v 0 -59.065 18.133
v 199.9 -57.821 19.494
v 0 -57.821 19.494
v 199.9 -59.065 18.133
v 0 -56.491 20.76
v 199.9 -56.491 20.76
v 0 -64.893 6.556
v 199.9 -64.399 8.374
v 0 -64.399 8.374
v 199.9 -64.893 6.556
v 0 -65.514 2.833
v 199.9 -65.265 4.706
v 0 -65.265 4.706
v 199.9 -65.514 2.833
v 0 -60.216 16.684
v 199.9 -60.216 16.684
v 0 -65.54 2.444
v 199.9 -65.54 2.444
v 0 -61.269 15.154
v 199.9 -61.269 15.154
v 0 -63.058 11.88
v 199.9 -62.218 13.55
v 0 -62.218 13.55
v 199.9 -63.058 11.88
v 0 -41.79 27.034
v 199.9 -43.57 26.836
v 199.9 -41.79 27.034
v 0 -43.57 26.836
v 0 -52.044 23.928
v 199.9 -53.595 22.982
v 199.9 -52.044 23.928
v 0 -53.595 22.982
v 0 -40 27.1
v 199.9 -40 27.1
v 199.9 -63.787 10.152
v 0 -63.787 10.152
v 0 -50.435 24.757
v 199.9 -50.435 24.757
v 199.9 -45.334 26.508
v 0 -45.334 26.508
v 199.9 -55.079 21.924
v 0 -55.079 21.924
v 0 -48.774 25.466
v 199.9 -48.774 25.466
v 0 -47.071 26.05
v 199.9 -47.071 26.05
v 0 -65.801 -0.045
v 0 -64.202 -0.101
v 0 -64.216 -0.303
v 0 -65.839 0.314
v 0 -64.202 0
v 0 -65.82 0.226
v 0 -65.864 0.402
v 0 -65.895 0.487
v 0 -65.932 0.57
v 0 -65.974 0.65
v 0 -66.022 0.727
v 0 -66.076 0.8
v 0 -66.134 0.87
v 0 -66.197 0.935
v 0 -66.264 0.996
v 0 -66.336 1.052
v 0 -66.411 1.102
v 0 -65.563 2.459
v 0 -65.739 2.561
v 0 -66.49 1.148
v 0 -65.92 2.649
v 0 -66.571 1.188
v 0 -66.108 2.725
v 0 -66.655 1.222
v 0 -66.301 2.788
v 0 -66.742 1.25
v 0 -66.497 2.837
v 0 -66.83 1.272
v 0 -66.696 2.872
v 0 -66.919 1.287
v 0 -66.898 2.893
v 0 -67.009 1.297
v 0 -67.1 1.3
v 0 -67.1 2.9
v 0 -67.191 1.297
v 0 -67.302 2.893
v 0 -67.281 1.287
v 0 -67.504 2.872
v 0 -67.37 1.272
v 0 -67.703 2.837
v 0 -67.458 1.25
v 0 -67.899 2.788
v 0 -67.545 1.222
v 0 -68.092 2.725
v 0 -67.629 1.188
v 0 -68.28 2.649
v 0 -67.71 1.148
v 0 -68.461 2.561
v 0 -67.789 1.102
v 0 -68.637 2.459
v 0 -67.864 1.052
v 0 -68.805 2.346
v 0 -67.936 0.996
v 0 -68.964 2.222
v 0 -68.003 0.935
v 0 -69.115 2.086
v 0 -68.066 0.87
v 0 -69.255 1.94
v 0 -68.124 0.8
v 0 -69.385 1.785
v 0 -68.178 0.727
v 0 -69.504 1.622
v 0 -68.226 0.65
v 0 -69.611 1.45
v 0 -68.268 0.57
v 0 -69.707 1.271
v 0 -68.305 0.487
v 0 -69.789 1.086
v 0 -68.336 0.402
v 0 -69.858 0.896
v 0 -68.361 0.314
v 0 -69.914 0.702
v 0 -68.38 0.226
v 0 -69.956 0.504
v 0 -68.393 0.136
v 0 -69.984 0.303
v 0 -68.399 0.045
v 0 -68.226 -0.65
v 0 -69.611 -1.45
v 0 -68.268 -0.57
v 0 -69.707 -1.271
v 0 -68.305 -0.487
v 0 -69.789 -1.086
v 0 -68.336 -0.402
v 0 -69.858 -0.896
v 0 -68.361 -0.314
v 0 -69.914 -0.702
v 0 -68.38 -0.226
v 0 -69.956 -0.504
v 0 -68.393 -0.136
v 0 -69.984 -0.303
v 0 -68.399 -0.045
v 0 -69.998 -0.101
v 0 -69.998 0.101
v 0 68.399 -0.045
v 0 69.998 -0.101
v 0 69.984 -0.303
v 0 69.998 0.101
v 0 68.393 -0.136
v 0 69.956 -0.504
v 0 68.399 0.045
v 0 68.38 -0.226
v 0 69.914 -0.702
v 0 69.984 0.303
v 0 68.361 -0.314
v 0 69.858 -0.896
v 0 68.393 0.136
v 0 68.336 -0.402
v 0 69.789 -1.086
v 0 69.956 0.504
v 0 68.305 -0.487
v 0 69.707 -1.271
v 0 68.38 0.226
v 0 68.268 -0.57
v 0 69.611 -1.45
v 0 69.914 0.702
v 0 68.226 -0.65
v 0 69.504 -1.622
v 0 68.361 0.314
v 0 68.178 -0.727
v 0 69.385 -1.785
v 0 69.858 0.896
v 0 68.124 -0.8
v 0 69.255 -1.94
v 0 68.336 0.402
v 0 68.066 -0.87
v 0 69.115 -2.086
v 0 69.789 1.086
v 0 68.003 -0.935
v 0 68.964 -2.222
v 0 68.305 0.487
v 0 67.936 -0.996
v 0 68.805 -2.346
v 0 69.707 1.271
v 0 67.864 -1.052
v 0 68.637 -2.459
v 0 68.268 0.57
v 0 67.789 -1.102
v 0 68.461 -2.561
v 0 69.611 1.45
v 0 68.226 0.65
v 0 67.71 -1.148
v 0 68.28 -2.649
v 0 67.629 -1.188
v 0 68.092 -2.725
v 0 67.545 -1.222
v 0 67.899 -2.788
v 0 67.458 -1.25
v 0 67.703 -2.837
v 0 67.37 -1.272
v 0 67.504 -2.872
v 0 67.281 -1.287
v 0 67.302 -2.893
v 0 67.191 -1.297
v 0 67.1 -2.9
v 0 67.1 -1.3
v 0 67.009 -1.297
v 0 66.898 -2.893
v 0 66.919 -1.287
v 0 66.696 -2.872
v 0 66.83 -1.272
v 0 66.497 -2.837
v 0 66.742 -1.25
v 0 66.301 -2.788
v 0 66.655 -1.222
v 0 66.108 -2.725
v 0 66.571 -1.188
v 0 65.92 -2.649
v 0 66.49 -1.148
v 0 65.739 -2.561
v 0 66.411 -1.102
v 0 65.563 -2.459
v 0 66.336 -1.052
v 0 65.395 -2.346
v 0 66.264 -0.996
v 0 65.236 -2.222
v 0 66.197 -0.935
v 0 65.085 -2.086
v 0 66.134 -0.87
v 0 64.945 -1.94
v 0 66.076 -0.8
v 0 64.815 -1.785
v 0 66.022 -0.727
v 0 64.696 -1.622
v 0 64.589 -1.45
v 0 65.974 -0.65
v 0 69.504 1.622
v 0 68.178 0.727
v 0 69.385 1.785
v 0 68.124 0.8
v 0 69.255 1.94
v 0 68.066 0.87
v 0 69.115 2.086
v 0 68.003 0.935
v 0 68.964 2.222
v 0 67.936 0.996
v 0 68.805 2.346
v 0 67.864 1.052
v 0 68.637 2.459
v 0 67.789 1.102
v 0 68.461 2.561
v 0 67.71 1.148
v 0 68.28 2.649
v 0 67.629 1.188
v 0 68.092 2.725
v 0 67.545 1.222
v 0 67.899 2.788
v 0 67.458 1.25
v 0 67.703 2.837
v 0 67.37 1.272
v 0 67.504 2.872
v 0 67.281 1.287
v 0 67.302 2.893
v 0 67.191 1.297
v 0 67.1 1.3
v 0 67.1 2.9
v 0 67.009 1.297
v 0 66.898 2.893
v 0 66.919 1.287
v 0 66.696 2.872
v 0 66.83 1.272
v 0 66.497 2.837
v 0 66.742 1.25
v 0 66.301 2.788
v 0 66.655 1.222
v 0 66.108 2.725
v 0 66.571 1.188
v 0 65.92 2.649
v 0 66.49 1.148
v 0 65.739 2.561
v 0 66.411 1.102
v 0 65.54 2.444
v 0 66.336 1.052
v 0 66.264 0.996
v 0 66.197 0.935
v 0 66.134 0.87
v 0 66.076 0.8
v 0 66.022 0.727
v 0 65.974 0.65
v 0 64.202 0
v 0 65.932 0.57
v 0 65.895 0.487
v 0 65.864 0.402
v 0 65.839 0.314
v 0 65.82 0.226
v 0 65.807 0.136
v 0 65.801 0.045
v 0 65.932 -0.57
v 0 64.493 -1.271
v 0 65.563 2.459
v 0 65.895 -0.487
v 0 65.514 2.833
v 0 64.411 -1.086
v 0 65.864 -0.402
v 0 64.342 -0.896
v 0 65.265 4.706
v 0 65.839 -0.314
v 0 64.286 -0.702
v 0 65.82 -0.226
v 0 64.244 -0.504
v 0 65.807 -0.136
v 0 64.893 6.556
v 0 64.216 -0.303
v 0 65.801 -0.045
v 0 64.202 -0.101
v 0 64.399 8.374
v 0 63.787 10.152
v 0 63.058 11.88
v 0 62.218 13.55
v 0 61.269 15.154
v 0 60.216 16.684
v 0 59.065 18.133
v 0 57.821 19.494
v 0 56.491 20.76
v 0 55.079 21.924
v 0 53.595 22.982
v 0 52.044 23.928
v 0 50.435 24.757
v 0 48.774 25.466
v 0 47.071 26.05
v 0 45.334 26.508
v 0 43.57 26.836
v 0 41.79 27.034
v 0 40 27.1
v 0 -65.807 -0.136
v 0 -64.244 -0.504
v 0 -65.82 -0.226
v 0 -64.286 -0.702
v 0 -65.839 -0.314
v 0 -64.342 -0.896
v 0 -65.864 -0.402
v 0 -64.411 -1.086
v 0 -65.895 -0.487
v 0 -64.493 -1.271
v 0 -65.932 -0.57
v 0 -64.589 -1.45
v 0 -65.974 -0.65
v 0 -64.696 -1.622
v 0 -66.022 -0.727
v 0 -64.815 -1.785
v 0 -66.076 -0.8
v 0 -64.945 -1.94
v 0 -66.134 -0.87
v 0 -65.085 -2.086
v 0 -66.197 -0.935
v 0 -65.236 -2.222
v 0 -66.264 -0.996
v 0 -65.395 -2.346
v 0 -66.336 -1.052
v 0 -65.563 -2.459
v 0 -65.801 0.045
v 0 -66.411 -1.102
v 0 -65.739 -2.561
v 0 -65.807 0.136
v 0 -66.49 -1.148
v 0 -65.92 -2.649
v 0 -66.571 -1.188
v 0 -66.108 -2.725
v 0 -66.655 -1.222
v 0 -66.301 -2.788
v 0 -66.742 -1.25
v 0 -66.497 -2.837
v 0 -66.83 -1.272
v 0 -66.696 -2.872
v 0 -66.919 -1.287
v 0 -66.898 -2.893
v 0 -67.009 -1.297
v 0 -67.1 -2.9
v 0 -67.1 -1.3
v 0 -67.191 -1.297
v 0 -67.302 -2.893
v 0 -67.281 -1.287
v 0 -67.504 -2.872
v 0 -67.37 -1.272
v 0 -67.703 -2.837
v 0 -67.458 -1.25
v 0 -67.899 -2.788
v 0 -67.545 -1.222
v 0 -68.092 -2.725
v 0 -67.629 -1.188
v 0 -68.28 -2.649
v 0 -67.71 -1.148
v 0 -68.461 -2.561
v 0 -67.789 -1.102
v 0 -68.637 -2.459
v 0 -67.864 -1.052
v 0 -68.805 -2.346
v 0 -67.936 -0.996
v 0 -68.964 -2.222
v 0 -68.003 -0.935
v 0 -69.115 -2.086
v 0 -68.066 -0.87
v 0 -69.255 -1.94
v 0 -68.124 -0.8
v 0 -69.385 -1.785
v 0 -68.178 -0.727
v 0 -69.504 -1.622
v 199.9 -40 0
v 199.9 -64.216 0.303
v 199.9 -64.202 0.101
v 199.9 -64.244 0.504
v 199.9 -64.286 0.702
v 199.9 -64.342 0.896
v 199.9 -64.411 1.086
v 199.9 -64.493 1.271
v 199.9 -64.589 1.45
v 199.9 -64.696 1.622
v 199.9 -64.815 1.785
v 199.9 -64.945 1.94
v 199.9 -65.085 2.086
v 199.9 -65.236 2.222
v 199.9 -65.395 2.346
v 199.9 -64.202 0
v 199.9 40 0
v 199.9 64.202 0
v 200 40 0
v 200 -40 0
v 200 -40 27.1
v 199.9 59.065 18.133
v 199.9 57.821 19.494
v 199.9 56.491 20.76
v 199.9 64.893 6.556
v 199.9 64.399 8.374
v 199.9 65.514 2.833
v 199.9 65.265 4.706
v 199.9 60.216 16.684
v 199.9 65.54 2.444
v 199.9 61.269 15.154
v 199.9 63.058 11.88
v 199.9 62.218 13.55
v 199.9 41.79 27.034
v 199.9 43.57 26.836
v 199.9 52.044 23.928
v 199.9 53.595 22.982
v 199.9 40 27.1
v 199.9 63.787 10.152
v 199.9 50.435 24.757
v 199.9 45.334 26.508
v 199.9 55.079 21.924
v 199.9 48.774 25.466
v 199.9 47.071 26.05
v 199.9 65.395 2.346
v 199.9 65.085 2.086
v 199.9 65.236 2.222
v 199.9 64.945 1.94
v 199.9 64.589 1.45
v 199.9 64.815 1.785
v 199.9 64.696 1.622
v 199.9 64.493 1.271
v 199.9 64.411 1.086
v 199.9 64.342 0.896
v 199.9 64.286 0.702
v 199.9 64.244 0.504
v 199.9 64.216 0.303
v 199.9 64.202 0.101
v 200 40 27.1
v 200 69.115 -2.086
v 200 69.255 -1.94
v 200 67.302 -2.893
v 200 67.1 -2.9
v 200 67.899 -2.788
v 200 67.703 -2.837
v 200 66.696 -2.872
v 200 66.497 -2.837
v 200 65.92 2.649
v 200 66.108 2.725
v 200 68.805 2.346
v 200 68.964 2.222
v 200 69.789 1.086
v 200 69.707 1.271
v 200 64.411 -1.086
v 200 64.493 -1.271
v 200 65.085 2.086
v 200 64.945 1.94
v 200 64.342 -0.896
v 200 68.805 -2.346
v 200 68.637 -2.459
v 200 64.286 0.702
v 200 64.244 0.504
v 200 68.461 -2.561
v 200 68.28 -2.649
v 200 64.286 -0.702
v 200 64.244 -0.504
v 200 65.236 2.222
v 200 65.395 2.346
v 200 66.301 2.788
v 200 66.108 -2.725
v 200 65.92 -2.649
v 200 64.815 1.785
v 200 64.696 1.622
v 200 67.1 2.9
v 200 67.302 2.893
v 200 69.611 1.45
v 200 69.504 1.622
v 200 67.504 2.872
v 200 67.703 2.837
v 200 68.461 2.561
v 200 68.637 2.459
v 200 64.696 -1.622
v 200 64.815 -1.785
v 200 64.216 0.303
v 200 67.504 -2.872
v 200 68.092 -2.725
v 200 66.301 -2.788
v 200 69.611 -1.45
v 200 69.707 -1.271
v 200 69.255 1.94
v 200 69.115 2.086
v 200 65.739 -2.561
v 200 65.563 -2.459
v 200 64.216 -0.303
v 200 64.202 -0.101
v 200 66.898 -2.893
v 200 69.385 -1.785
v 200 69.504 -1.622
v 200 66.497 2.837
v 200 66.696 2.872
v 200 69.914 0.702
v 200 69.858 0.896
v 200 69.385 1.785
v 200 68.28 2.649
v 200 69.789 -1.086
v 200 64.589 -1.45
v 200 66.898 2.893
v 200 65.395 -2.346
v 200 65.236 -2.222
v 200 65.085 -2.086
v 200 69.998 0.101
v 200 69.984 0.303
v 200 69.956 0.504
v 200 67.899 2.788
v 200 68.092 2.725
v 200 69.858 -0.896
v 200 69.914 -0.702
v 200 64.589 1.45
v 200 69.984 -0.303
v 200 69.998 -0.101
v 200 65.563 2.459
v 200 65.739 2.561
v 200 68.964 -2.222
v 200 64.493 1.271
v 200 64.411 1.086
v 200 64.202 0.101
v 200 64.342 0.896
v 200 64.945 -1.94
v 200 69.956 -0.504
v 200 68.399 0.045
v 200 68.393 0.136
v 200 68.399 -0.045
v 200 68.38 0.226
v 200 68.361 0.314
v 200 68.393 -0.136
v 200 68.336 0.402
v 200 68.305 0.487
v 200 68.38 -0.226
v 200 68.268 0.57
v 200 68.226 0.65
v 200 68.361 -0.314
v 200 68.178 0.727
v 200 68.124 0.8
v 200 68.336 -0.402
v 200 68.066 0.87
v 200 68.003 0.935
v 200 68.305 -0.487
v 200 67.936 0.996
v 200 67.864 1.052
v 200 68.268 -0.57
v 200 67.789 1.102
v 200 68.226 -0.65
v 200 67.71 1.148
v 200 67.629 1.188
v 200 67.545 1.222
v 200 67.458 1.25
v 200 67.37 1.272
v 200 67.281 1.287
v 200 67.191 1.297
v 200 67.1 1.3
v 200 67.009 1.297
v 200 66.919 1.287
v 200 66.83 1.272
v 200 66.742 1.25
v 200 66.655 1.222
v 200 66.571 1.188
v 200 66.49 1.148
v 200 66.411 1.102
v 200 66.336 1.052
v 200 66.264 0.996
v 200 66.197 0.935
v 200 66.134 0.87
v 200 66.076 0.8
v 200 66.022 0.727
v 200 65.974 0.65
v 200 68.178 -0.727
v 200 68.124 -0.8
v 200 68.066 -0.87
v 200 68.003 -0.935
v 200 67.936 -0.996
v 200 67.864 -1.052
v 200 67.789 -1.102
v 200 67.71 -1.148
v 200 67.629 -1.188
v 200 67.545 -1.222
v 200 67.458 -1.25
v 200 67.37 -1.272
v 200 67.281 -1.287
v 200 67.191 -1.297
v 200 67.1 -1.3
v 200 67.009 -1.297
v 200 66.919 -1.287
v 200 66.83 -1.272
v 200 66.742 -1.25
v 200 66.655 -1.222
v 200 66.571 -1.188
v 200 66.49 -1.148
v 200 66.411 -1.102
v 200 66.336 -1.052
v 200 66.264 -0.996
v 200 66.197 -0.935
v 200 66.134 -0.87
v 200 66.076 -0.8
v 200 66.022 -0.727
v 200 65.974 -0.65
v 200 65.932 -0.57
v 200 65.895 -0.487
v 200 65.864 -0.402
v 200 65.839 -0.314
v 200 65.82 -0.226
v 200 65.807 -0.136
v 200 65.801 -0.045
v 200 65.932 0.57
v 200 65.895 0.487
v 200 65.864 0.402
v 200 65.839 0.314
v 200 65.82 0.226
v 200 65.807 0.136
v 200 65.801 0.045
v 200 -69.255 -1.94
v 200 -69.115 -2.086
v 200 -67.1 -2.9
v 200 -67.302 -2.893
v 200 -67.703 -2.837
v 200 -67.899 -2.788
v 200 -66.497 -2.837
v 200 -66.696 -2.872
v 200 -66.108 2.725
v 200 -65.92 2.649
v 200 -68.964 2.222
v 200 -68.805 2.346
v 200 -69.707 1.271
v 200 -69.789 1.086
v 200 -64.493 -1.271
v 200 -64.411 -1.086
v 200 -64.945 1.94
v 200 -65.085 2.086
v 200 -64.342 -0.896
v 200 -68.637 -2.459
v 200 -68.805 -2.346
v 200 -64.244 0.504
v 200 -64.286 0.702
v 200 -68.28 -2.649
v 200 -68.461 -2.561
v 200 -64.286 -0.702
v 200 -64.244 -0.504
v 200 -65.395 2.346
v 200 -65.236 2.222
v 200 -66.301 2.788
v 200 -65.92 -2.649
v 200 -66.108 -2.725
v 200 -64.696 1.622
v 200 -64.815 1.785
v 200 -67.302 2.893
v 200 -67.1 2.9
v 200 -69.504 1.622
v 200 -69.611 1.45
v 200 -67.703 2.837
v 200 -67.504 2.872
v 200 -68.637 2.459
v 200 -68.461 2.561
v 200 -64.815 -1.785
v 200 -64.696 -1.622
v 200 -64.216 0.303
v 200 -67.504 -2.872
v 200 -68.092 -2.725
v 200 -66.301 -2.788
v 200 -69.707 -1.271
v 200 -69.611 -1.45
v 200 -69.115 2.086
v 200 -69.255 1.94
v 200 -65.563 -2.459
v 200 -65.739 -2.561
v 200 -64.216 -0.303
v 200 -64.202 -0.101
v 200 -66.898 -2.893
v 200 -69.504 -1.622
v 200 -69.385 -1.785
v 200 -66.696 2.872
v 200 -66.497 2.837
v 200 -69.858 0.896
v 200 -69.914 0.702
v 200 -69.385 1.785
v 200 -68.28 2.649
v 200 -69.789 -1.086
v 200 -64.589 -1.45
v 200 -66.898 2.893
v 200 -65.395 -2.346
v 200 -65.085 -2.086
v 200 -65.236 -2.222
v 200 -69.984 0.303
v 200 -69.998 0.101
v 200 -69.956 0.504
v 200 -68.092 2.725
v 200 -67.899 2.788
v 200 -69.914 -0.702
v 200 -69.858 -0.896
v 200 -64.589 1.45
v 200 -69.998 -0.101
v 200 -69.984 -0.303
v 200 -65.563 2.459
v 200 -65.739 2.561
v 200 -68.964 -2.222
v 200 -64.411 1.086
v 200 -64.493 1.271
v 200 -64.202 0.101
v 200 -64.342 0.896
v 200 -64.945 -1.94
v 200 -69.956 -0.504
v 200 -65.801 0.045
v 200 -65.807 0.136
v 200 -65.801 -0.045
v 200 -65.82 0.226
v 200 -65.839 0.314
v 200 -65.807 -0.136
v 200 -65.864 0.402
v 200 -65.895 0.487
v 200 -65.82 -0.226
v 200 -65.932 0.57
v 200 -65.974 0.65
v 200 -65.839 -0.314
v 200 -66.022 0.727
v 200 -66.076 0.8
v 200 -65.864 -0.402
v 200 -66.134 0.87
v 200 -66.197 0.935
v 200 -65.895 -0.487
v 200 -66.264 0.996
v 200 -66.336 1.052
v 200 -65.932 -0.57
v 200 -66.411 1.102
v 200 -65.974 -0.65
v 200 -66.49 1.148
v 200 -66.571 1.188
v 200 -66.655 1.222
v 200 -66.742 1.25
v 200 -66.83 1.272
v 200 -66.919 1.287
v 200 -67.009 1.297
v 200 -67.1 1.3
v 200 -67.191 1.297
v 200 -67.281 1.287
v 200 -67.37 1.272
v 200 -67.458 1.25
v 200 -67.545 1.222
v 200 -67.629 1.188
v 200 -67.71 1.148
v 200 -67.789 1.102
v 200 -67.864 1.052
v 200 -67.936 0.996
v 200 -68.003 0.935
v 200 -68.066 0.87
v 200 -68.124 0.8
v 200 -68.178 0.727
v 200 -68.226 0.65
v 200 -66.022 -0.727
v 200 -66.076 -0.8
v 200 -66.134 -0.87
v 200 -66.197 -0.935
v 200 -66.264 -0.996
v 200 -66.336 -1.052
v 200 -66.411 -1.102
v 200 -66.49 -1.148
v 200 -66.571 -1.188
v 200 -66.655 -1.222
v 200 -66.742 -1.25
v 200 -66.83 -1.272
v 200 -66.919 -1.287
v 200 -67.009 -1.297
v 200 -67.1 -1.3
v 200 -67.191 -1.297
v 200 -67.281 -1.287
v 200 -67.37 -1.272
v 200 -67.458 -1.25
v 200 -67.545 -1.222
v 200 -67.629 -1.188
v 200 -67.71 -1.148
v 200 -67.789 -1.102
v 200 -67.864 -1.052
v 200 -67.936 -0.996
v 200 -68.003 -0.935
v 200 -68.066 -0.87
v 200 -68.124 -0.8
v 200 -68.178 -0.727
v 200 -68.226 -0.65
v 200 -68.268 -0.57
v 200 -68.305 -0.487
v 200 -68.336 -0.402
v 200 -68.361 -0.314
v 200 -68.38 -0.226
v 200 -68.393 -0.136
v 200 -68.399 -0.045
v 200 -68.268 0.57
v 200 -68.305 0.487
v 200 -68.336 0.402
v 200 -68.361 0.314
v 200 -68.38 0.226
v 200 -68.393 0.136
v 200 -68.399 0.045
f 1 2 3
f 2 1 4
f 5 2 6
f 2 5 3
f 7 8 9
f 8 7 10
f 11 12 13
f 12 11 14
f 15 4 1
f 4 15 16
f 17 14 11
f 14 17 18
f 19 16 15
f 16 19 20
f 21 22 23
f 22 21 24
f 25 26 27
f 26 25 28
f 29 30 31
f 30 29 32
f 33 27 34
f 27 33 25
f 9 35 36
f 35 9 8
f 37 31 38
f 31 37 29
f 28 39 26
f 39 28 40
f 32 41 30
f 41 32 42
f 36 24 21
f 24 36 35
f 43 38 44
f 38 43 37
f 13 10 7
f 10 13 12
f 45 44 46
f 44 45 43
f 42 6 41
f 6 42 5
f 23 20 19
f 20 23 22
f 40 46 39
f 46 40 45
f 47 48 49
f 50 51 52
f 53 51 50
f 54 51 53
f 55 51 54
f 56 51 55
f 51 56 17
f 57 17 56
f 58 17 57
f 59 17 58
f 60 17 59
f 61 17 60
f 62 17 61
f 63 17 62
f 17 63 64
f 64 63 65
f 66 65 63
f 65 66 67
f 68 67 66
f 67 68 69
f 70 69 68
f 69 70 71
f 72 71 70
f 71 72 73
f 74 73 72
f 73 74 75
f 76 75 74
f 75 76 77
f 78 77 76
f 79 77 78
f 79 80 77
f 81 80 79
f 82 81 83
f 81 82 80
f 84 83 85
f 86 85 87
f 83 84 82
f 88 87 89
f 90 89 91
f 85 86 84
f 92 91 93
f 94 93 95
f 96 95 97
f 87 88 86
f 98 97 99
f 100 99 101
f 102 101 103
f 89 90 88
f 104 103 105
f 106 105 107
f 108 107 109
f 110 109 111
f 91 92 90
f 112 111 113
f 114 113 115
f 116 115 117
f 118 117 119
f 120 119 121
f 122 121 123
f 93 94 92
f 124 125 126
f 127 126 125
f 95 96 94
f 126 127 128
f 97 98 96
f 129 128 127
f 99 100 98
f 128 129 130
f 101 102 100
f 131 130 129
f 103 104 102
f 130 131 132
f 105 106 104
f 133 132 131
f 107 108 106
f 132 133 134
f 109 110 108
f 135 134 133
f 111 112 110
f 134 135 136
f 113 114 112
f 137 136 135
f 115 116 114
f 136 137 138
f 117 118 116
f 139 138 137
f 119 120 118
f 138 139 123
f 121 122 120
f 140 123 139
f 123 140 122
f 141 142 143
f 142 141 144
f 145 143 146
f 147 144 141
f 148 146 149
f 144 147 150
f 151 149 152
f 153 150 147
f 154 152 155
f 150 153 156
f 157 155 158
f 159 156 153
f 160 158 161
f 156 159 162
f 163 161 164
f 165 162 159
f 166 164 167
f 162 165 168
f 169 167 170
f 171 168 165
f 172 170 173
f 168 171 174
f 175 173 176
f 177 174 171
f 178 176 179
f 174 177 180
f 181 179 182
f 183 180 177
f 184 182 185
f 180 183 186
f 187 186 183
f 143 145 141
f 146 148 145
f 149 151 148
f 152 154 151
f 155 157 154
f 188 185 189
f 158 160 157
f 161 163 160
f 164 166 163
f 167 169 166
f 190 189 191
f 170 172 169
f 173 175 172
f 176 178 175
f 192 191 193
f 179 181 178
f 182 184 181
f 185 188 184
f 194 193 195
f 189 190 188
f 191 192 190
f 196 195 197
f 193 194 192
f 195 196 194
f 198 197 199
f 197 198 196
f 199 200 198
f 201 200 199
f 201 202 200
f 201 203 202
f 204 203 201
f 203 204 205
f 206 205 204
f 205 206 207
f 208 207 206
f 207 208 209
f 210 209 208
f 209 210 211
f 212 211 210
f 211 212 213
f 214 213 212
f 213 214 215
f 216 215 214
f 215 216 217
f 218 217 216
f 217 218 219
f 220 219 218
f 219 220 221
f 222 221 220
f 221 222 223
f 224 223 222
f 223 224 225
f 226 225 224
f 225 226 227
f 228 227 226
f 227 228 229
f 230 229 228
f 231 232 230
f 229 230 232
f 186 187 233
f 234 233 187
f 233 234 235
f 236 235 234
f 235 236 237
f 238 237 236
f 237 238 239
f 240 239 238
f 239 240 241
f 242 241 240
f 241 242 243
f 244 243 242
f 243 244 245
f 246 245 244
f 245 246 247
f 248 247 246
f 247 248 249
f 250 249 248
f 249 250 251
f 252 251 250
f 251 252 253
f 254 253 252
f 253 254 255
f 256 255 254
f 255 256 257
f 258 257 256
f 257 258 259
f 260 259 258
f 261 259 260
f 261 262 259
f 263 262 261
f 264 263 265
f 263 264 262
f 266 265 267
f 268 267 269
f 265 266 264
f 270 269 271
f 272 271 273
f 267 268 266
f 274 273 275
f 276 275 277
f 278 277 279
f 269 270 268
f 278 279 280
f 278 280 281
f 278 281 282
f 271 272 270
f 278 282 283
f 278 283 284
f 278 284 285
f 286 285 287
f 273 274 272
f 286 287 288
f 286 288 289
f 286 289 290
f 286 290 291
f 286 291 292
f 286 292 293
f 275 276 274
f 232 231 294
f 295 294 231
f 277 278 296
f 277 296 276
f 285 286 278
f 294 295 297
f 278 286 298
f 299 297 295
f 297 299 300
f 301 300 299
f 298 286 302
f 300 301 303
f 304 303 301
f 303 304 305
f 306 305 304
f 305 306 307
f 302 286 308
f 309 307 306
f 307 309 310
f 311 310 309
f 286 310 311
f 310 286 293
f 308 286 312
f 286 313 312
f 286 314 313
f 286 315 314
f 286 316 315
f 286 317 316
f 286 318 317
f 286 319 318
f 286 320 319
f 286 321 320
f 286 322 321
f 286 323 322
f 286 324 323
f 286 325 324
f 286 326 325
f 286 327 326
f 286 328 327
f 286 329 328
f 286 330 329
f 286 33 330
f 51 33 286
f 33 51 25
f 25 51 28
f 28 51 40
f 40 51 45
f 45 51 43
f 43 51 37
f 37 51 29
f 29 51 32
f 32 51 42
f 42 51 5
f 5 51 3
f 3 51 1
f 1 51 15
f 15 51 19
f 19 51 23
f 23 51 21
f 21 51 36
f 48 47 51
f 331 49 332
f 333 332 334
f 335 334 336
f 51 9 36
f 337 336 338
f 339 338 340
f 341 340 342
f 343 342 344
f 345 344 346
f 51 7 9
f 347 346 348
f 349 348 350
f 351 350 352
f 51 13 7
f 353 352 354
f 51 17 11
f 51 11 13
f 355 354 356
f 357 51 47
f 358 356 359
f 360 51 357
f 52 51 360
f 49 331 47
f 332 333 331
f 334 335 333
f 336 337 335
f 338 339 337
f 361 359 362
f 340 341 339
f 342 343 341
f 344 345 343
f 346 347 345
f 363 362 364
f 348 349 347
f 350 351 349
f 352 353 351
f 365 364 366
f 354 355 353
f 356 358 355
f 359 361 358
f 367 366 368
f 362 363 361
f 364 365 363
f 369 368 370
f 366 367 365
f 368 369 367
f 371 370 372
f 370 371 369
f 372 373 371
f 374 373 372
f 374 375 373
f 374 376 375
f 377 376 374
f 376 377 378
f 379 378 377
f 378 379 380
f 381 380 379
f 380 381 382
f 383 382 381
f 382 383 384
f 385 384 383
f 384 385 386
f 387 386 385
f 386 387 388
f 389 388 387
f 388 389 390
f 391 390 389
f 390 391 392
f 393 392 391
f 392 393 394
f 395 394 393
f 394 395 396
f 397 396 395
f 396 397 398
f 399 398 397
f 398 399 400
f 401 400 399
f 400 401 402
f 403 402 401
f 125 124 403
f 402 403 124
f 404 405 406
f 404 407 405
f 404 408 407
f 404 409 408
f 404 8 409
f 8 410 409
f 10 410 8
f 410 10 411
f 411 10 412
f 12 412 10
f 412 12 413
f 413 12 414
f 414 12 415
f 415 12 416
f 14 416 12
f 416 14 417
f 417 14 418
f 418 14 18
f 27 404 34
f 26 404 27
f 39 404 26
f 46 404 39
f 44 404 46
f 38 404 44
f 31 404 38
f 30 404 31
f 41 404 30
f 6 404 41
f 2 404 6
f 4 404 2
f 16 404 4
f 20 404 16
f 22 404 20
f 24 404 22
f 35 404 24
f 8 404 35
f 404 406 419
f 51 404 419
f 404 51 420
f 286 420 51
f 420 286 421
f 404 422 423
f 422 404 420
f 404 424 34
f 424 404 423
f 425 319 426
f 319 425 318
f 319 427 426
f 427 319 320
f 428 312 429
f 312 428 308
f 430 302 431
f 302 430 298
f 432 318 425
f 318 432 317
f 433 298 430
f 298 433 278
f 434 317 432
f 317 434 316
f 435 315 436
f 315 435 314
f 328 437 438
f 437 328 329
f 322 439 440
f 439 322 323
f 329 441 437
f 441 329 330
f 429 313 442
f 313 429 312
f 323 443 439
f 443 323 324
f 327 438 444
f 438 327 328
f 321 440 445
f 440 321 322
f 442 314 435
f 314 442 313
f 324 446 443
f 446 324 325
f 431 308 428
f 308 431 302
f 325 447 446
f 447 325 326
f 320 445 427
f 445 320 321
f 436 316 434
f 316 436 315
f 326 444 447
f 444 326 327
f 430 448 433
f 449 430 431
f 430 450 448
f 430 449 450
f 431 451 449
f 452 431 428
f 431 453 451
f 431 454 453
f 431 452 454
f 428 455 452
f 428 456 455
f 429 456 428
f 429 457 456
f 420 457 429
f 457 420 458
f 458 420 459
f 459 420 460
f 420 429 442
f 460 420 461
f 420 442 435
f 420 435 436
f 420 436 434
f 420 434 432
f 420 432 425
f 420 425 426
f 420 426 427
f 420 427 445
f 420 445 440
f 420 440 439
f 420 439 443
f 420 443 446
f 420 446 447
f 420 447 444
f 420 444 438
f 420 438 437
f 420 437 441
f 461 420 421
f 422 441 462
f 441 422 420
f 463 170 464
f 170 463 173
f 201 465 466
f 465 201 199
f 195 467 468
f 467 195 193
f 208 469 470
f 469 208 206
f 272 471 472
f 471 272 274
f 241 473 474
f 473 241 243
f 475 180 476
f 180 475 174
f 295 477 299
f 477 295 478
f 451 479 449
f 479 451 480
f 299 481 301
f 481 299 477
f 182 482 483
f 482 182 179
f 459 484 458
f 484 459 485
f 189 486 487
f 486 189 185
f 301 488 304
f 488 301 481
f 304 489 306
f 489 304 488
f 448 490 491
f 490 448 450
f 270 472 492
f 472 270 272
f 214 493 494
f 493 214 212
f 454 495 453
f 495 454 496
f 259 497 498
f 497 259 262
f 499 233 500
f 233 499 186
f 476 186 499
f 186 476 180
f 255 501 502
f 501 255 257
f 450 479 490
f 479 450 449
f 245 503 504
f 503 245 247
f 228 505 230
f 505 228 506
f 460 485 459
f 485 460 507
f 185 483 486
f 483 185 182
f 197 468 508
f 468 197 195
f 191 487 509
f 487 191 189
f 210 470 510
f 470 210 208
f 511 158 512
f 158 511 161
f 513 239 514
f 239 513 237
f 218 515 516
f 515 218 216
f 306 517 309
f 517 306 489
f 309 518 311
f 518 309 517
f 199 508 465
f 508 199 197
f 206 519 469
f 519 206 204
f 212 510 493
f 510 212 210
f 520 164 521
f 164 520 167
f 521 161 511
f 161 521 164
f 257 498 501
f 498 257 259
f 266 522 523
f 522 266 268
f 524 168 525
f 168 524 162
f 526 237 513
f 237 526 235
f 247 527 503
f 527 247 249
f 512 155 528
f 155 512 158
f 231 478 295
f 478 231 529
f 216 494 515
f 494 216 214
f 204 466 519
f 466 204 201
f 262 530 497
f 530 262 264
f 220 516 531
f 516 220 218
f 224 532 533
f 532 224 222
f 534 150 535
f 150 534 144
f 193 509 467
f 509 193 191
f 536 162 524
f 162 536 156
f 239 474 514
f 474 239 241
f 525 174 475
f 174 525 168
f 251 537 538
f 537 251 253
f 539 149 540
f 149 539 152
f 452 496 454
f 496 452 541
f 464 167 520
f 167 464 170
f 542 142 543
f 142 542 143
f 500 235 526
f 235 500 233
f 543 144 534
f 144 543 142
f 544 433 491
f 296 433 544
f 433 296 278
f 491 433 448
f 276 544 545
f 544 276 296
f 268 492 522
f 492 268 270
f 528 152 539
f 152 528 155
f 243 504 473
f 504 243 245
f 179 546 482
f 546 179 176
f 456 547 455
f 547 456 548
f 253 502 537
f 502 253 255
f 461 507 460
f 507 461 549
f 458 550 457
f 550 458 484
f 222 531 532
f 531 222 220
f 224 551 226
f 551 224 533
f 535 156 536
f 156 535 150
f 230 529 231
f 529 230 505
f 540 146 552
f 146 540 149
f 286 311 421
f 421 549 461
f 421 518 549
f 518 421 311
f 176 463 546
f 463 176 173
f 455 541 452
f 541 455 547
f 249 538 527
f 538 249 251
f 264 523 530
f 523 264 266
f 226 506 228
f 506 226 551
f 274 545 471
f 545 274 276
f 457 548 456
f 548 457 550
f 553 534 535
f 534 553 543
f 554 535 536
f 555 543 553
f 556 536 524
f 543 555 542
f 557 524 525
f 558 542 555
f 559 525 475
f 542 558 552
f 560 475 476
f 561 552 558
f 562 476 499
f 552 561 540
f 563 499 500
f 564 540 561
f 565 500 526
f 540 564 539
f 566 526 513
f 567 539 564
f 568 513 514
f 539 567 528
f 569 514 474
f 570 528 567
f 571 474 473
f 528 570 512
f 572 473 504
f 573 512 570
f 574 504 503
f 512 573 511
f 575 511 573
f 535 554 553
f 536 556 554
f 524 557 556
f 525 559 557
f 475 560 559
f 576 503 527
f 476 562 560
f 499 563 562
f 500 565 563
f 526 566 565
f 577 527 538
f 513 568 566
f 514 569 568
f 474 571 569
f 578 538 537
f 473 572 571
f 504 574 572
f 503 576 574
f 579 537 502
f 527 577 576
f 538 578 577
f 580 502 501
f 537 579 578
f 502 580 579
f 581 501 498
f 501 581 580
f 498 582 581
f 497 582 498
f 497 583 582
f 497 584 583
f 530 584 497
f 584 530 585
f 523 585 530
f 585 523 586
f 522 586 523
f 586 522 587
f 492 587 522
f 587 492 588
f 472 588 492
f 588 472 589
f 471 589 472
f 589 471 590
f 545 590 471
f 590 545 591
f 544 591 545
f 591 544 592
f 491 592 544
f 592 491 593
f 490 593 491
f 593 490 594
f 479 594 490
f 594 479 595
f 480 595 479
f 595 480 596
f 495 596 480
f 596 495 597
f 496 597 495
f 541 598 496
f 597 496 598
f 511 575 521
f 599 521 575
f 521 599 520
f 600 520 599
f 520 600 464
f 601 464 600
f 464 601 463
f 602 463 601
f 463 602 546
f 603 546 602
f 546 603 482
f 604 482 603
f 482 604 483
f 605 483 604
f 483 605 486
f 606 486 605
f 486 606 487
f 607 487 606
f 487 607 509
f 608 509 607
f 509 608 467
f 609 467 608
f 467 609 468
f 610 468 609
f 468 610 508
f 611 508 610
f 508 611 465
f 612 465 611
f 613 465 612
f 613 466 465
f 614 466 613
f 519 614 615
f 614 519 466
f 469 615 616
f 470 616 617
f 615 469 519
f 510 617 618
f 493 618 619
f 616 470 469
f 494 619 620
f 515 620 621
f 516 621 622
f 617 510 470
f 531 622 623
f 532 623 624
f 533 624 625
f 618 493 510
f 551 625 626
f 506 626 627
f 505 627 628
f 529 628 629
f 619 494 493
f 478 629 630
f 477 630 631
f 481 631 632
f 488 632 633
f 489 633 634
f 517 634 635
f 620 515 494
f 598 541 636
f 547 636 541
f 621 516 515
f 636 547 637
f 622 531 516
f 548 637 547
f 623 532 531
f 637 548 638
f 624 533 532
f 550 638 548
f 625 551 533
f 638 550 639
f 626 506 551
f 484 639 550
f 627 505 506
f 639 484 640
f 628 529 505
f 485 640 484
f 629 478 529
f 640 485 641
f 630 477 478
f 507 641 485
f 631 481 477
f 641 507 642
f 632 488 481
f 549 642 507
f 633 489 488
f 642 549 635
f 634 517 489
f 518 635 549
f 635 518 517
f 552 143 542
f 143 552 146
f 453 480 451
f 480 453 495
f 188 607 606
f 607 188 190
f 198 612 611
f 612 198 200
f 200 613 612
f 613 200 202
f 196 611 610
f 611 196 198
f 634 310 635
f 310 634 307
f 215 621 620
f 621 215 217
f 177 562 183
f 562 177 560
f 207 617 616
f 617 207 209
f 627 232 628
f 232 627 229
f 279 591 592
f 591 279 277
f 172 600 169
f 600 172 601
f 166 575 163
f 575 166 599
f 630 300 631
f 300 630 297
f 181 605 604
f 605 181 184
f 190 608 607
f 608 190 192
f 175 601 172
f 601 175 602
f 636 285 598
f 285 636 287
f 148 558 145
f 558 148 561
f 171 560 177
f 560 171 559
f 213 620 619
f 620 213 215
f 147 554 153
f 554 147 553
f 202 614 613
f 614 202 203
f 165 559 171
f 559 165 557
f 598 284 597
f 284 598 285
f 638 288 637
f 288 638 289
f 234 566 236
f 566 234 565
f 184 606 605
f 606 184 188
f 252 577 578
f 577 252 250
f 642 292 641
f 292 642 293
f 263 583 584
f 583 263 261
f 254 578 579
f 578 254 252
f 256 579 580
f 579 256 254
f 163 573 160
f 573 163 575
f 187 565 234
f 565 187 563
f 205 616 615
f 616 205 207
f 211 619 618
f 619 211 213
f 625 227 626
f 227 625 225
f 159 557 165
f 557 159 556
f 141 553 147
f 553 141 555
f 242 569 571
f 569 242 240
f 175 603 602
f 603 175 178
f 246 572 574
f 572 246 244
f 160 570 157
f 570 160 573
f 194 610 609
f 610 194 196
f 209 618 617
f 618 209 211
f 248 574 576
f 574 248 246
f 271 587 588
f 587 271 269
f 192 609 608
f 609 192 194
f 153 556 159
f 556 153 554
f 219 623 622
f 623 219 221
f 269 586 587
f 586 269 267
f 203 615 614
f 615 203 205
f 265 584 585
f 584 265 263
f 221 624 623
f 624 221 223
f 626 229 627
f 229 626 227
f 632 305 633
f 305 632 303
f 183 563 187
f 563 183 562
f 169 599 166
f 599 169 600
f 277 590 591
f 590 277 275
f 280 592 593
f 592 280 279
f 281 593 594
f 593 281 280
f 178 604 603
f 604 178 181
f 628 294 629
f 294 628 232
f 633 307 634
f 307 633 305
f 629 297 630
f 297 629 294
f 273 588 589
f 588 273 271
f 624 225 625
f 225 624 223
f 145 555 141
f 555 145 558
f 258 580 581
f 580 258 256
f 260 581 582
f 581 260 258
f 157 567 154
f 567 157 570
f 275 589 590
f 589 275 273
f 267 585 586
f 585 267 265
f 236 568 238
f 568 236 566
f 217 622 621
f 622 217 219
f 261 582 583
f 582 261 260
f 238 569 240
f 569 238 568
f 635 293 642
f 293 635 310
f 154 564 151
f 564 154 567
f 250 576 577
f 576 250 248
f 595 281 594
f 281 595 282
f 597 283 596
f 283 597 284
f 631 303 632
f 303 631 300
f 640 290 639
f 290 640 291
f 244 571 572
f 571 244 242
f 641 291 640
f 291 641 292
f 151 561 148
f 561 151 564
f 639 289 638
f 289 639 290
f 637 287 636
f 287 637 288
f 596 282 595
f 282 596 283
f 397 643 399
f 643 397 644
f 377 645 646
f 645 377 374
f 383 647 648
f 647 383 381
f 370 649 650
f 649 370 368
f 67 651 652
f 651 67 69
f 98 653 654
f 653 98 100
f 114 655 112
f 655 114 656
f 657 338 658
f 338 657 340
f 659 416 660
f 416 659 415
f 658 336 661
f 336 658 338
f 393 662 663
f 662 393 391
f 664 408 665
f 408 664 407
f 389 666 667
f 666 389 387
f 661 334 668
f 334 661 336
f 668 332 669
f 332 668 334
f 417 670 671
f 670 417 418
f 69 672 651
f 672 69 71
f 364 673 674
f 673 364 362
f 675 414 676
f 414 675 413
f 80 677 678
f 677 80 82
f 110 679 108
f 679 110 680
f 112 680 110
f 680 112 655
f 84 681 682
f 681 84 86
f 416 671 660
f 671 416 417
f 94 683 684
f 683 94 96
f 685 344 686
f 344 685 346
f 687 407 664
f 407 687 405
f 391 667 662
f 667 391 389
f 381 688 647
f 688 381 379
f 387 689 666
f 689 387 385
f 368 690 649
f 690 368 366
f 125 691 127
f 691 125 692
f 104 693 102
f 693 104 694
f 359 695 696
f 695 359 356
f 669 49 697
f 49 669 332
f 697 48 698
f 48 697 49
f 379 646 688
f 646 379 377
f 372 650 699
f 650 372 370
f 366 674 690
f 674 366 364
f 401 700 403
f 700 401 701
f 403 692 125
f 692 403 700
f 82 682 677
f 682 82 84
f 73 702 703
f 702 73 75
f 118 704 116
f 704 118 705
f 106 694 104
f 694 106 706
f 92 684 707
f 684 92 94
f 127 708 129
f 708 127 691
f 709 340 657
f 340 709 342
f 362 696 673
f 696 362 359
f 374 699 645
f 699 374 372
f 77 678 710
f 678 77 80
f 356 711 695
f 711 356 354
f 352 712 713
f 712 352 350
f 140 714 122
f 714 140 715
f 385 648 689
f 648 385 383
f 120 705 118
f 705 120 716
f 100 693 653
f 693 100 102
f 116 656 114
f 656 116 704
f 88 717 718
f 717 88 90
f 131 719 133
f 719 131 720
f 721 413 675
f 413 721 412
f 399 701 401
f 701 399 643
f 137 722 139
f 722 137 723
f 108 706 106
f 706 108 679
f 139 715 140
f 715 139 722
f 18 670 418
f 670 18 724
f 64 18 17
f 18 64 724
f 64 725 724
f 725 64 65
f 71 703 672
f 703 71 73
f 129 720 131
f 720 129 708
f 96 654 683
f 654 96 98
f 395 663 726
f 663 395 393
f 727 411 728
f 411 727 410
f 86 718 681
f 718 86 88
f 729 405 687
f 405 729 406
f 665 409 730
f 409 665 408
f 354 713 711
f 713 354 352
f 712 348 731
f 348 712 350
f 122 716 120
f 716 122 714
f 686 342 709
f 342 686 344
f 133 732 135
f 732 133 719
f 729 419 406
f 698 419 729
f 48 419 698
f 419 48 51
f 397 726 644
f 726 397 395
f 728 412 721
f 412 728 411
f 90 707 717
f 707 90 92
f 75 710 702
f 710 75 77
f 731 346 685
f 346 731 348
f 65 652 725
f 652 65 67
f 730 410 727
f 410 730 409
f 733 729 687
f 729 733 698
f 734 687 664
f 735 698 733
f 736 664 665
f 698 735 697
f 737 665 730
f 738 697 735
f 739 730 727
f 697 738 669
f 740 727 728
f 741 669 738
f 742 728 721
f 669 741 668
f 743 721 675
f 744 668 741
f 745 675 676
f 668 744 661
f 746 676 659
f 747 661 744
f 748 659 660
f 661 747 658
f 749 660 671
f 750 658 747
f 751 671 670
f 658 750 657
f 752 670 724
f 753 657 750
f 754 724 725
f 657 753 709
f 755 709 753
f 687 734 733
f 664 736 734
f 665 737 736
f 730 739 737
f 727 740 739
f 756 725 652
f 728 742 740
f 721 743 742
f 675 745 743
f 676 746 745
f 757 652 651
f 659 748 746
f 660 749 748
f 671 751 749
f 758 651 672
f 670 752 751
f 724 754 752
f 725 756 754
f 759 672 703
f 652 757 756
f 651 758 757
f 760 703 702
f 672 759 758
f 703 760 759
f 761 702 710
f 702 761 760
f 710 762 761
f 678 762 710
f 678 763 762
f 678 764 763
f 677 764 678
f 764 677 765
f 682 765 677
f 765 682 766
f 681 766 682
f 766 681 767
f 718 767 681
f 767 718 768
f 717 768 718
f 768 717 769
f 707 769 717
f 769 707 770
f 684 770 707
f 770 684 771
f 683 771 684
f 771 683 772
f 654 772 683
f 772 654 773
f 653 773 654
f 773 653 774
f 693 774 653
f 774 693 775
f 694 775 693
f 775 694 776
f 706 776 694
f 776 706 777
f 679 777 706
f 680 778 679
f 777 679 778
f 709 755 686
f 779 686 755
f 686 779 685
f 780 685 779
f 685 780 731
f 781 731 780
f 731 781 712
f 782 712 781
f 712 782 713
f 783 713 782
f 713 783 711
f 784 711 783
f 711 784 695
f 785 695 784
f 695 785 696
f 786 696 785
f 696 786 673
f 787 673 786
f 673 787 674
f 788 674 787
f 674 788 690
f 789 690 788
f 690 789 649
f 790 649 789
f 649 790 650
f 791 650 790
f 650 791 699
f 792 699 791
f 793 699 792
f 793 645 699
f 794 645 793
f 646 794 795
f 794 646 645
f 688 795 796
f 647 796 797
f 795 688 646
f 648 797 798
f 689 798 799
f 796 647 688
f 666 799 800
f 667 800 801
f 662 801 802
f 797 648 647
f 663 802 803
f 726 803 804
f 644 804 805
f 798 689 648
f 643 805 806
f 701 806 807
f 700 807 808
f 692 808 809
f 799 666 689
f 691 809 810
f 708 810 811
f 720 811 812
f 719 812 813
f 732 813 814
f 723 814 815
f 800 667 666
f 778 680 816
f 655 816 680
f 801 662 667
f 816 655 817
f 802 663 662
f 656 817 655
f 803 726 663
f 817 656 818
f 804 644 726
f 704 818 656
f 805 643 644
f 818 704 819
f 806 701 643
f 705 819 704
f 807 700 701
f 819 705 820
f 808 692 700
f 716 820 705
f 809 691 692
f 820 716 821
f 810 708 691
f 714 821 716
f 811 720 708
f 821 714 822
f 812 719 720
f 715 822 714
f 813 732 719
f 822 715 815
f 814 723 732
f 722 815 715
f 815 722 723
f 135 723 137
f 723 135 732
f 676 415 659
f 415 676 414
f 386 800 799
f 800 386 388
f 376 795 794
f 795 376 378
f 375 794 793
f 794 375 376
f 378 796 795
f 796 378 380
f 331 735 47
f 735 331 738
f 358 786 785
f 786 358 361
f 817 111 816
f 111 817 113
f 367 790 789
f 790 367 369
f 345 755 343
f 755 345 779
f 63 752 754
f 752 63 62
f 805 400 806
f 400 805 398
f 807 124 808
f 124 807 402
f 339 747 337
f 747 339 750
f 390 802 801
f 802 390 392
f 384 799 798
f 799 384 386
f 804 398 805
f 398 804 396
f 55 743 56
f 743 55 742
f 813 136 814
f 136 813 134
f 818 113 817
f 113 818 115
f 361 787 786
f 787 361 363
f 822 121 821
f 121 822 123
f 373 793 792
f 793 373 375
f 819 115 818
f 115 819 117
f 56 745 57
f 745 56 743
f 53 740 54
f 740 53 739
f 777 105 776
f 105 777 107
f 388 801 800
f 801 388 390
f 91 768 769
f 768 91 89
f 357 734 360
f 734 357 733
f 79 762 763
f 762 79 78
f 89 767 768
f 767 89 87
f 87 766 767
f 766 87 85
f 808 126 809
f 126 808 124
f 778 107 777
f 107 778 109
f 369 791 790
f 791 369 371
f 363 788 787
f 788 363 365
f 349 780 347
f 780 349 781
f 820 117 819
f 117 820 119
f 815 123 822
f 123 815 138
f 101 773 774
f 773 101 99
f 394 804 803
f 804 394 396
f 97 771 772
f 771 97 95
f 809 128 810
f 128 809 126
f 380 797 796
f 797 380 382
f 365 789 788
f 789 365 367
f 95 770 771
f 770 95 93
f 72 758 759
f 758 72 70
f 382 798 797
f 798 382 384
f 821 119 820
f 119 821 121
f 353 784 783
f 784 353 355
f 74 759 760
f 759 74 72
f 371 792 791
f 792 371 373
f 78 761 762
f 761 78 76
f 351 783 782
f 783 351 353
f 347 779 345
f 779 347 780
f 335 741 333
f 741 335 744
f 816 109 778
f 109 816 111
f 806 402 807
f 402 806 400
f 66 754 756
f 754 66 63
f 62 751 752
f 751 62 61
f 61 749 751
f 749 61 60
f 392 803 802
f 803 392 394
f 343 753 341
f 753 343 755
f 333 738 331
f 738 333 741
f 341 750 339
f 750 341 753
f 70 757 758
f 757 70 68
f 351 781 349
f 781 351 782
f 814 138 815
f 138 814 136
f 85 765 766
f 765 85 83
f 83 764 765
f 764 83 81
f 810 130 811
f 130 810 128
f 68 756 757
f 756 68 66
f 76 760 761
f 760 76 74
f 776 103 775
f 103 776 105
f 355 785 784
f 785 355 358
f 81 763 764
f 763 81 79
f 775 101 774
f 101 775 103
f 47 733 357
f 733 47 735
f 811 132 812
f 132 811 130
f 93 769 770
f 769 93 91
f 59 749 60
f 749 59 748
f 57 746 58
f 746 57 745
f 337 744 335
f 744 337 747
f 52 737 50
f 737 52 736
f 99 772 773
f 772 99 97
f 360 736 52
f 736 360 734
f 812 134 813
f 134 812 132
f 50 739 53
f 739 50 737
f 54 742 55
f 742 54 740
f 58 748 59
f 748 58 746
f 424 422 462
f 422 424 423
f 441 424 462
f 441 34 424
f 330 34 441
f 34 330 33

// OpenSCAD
extrusion_width=1.6;
wall=extrusion_width;
overlap=wall*2;
gap=0.5;

battery_x=200;
battery_y=80;
battery_z=30;

shell_y=140;

pad=0.1;
padd=pad*2;


$fn=90;

translate([0,-battery_y/2,0])
cube([battery_x,battery_y,battery_z-wall*1.5-gap]);
sides();
grips();

module sides() {
    side();
    mirror([0,1,0])
    side();
}

module grips() {
    grip();
    mirror([0,1,0])
    grip();
}

module side() {
    translate([0,-battery_y/2,0])
    scale([1,(shell_y-wall*2-battery_y)/battery_z/2,1])
    intersection() {
        rotate([0,90,0])
        cylinder(d=battery_z*2-wall*3-gap*2,h=battery_x);
        translate([-pad,-battery_y,0])
        cube([battery_x,battery_y,battery_z]);
    }
}

module grip() {
    translate([0,shell_y/2-wall*1.5-gap,0])
    rotate([0,90,0])
    difference() {
        cylinder(d=wall*3+gap*2,h=battery_x);
        translate([0,0,-pad])
        cylinder(d=wall+gap*2,h=battery_x+padd);
    }
}
